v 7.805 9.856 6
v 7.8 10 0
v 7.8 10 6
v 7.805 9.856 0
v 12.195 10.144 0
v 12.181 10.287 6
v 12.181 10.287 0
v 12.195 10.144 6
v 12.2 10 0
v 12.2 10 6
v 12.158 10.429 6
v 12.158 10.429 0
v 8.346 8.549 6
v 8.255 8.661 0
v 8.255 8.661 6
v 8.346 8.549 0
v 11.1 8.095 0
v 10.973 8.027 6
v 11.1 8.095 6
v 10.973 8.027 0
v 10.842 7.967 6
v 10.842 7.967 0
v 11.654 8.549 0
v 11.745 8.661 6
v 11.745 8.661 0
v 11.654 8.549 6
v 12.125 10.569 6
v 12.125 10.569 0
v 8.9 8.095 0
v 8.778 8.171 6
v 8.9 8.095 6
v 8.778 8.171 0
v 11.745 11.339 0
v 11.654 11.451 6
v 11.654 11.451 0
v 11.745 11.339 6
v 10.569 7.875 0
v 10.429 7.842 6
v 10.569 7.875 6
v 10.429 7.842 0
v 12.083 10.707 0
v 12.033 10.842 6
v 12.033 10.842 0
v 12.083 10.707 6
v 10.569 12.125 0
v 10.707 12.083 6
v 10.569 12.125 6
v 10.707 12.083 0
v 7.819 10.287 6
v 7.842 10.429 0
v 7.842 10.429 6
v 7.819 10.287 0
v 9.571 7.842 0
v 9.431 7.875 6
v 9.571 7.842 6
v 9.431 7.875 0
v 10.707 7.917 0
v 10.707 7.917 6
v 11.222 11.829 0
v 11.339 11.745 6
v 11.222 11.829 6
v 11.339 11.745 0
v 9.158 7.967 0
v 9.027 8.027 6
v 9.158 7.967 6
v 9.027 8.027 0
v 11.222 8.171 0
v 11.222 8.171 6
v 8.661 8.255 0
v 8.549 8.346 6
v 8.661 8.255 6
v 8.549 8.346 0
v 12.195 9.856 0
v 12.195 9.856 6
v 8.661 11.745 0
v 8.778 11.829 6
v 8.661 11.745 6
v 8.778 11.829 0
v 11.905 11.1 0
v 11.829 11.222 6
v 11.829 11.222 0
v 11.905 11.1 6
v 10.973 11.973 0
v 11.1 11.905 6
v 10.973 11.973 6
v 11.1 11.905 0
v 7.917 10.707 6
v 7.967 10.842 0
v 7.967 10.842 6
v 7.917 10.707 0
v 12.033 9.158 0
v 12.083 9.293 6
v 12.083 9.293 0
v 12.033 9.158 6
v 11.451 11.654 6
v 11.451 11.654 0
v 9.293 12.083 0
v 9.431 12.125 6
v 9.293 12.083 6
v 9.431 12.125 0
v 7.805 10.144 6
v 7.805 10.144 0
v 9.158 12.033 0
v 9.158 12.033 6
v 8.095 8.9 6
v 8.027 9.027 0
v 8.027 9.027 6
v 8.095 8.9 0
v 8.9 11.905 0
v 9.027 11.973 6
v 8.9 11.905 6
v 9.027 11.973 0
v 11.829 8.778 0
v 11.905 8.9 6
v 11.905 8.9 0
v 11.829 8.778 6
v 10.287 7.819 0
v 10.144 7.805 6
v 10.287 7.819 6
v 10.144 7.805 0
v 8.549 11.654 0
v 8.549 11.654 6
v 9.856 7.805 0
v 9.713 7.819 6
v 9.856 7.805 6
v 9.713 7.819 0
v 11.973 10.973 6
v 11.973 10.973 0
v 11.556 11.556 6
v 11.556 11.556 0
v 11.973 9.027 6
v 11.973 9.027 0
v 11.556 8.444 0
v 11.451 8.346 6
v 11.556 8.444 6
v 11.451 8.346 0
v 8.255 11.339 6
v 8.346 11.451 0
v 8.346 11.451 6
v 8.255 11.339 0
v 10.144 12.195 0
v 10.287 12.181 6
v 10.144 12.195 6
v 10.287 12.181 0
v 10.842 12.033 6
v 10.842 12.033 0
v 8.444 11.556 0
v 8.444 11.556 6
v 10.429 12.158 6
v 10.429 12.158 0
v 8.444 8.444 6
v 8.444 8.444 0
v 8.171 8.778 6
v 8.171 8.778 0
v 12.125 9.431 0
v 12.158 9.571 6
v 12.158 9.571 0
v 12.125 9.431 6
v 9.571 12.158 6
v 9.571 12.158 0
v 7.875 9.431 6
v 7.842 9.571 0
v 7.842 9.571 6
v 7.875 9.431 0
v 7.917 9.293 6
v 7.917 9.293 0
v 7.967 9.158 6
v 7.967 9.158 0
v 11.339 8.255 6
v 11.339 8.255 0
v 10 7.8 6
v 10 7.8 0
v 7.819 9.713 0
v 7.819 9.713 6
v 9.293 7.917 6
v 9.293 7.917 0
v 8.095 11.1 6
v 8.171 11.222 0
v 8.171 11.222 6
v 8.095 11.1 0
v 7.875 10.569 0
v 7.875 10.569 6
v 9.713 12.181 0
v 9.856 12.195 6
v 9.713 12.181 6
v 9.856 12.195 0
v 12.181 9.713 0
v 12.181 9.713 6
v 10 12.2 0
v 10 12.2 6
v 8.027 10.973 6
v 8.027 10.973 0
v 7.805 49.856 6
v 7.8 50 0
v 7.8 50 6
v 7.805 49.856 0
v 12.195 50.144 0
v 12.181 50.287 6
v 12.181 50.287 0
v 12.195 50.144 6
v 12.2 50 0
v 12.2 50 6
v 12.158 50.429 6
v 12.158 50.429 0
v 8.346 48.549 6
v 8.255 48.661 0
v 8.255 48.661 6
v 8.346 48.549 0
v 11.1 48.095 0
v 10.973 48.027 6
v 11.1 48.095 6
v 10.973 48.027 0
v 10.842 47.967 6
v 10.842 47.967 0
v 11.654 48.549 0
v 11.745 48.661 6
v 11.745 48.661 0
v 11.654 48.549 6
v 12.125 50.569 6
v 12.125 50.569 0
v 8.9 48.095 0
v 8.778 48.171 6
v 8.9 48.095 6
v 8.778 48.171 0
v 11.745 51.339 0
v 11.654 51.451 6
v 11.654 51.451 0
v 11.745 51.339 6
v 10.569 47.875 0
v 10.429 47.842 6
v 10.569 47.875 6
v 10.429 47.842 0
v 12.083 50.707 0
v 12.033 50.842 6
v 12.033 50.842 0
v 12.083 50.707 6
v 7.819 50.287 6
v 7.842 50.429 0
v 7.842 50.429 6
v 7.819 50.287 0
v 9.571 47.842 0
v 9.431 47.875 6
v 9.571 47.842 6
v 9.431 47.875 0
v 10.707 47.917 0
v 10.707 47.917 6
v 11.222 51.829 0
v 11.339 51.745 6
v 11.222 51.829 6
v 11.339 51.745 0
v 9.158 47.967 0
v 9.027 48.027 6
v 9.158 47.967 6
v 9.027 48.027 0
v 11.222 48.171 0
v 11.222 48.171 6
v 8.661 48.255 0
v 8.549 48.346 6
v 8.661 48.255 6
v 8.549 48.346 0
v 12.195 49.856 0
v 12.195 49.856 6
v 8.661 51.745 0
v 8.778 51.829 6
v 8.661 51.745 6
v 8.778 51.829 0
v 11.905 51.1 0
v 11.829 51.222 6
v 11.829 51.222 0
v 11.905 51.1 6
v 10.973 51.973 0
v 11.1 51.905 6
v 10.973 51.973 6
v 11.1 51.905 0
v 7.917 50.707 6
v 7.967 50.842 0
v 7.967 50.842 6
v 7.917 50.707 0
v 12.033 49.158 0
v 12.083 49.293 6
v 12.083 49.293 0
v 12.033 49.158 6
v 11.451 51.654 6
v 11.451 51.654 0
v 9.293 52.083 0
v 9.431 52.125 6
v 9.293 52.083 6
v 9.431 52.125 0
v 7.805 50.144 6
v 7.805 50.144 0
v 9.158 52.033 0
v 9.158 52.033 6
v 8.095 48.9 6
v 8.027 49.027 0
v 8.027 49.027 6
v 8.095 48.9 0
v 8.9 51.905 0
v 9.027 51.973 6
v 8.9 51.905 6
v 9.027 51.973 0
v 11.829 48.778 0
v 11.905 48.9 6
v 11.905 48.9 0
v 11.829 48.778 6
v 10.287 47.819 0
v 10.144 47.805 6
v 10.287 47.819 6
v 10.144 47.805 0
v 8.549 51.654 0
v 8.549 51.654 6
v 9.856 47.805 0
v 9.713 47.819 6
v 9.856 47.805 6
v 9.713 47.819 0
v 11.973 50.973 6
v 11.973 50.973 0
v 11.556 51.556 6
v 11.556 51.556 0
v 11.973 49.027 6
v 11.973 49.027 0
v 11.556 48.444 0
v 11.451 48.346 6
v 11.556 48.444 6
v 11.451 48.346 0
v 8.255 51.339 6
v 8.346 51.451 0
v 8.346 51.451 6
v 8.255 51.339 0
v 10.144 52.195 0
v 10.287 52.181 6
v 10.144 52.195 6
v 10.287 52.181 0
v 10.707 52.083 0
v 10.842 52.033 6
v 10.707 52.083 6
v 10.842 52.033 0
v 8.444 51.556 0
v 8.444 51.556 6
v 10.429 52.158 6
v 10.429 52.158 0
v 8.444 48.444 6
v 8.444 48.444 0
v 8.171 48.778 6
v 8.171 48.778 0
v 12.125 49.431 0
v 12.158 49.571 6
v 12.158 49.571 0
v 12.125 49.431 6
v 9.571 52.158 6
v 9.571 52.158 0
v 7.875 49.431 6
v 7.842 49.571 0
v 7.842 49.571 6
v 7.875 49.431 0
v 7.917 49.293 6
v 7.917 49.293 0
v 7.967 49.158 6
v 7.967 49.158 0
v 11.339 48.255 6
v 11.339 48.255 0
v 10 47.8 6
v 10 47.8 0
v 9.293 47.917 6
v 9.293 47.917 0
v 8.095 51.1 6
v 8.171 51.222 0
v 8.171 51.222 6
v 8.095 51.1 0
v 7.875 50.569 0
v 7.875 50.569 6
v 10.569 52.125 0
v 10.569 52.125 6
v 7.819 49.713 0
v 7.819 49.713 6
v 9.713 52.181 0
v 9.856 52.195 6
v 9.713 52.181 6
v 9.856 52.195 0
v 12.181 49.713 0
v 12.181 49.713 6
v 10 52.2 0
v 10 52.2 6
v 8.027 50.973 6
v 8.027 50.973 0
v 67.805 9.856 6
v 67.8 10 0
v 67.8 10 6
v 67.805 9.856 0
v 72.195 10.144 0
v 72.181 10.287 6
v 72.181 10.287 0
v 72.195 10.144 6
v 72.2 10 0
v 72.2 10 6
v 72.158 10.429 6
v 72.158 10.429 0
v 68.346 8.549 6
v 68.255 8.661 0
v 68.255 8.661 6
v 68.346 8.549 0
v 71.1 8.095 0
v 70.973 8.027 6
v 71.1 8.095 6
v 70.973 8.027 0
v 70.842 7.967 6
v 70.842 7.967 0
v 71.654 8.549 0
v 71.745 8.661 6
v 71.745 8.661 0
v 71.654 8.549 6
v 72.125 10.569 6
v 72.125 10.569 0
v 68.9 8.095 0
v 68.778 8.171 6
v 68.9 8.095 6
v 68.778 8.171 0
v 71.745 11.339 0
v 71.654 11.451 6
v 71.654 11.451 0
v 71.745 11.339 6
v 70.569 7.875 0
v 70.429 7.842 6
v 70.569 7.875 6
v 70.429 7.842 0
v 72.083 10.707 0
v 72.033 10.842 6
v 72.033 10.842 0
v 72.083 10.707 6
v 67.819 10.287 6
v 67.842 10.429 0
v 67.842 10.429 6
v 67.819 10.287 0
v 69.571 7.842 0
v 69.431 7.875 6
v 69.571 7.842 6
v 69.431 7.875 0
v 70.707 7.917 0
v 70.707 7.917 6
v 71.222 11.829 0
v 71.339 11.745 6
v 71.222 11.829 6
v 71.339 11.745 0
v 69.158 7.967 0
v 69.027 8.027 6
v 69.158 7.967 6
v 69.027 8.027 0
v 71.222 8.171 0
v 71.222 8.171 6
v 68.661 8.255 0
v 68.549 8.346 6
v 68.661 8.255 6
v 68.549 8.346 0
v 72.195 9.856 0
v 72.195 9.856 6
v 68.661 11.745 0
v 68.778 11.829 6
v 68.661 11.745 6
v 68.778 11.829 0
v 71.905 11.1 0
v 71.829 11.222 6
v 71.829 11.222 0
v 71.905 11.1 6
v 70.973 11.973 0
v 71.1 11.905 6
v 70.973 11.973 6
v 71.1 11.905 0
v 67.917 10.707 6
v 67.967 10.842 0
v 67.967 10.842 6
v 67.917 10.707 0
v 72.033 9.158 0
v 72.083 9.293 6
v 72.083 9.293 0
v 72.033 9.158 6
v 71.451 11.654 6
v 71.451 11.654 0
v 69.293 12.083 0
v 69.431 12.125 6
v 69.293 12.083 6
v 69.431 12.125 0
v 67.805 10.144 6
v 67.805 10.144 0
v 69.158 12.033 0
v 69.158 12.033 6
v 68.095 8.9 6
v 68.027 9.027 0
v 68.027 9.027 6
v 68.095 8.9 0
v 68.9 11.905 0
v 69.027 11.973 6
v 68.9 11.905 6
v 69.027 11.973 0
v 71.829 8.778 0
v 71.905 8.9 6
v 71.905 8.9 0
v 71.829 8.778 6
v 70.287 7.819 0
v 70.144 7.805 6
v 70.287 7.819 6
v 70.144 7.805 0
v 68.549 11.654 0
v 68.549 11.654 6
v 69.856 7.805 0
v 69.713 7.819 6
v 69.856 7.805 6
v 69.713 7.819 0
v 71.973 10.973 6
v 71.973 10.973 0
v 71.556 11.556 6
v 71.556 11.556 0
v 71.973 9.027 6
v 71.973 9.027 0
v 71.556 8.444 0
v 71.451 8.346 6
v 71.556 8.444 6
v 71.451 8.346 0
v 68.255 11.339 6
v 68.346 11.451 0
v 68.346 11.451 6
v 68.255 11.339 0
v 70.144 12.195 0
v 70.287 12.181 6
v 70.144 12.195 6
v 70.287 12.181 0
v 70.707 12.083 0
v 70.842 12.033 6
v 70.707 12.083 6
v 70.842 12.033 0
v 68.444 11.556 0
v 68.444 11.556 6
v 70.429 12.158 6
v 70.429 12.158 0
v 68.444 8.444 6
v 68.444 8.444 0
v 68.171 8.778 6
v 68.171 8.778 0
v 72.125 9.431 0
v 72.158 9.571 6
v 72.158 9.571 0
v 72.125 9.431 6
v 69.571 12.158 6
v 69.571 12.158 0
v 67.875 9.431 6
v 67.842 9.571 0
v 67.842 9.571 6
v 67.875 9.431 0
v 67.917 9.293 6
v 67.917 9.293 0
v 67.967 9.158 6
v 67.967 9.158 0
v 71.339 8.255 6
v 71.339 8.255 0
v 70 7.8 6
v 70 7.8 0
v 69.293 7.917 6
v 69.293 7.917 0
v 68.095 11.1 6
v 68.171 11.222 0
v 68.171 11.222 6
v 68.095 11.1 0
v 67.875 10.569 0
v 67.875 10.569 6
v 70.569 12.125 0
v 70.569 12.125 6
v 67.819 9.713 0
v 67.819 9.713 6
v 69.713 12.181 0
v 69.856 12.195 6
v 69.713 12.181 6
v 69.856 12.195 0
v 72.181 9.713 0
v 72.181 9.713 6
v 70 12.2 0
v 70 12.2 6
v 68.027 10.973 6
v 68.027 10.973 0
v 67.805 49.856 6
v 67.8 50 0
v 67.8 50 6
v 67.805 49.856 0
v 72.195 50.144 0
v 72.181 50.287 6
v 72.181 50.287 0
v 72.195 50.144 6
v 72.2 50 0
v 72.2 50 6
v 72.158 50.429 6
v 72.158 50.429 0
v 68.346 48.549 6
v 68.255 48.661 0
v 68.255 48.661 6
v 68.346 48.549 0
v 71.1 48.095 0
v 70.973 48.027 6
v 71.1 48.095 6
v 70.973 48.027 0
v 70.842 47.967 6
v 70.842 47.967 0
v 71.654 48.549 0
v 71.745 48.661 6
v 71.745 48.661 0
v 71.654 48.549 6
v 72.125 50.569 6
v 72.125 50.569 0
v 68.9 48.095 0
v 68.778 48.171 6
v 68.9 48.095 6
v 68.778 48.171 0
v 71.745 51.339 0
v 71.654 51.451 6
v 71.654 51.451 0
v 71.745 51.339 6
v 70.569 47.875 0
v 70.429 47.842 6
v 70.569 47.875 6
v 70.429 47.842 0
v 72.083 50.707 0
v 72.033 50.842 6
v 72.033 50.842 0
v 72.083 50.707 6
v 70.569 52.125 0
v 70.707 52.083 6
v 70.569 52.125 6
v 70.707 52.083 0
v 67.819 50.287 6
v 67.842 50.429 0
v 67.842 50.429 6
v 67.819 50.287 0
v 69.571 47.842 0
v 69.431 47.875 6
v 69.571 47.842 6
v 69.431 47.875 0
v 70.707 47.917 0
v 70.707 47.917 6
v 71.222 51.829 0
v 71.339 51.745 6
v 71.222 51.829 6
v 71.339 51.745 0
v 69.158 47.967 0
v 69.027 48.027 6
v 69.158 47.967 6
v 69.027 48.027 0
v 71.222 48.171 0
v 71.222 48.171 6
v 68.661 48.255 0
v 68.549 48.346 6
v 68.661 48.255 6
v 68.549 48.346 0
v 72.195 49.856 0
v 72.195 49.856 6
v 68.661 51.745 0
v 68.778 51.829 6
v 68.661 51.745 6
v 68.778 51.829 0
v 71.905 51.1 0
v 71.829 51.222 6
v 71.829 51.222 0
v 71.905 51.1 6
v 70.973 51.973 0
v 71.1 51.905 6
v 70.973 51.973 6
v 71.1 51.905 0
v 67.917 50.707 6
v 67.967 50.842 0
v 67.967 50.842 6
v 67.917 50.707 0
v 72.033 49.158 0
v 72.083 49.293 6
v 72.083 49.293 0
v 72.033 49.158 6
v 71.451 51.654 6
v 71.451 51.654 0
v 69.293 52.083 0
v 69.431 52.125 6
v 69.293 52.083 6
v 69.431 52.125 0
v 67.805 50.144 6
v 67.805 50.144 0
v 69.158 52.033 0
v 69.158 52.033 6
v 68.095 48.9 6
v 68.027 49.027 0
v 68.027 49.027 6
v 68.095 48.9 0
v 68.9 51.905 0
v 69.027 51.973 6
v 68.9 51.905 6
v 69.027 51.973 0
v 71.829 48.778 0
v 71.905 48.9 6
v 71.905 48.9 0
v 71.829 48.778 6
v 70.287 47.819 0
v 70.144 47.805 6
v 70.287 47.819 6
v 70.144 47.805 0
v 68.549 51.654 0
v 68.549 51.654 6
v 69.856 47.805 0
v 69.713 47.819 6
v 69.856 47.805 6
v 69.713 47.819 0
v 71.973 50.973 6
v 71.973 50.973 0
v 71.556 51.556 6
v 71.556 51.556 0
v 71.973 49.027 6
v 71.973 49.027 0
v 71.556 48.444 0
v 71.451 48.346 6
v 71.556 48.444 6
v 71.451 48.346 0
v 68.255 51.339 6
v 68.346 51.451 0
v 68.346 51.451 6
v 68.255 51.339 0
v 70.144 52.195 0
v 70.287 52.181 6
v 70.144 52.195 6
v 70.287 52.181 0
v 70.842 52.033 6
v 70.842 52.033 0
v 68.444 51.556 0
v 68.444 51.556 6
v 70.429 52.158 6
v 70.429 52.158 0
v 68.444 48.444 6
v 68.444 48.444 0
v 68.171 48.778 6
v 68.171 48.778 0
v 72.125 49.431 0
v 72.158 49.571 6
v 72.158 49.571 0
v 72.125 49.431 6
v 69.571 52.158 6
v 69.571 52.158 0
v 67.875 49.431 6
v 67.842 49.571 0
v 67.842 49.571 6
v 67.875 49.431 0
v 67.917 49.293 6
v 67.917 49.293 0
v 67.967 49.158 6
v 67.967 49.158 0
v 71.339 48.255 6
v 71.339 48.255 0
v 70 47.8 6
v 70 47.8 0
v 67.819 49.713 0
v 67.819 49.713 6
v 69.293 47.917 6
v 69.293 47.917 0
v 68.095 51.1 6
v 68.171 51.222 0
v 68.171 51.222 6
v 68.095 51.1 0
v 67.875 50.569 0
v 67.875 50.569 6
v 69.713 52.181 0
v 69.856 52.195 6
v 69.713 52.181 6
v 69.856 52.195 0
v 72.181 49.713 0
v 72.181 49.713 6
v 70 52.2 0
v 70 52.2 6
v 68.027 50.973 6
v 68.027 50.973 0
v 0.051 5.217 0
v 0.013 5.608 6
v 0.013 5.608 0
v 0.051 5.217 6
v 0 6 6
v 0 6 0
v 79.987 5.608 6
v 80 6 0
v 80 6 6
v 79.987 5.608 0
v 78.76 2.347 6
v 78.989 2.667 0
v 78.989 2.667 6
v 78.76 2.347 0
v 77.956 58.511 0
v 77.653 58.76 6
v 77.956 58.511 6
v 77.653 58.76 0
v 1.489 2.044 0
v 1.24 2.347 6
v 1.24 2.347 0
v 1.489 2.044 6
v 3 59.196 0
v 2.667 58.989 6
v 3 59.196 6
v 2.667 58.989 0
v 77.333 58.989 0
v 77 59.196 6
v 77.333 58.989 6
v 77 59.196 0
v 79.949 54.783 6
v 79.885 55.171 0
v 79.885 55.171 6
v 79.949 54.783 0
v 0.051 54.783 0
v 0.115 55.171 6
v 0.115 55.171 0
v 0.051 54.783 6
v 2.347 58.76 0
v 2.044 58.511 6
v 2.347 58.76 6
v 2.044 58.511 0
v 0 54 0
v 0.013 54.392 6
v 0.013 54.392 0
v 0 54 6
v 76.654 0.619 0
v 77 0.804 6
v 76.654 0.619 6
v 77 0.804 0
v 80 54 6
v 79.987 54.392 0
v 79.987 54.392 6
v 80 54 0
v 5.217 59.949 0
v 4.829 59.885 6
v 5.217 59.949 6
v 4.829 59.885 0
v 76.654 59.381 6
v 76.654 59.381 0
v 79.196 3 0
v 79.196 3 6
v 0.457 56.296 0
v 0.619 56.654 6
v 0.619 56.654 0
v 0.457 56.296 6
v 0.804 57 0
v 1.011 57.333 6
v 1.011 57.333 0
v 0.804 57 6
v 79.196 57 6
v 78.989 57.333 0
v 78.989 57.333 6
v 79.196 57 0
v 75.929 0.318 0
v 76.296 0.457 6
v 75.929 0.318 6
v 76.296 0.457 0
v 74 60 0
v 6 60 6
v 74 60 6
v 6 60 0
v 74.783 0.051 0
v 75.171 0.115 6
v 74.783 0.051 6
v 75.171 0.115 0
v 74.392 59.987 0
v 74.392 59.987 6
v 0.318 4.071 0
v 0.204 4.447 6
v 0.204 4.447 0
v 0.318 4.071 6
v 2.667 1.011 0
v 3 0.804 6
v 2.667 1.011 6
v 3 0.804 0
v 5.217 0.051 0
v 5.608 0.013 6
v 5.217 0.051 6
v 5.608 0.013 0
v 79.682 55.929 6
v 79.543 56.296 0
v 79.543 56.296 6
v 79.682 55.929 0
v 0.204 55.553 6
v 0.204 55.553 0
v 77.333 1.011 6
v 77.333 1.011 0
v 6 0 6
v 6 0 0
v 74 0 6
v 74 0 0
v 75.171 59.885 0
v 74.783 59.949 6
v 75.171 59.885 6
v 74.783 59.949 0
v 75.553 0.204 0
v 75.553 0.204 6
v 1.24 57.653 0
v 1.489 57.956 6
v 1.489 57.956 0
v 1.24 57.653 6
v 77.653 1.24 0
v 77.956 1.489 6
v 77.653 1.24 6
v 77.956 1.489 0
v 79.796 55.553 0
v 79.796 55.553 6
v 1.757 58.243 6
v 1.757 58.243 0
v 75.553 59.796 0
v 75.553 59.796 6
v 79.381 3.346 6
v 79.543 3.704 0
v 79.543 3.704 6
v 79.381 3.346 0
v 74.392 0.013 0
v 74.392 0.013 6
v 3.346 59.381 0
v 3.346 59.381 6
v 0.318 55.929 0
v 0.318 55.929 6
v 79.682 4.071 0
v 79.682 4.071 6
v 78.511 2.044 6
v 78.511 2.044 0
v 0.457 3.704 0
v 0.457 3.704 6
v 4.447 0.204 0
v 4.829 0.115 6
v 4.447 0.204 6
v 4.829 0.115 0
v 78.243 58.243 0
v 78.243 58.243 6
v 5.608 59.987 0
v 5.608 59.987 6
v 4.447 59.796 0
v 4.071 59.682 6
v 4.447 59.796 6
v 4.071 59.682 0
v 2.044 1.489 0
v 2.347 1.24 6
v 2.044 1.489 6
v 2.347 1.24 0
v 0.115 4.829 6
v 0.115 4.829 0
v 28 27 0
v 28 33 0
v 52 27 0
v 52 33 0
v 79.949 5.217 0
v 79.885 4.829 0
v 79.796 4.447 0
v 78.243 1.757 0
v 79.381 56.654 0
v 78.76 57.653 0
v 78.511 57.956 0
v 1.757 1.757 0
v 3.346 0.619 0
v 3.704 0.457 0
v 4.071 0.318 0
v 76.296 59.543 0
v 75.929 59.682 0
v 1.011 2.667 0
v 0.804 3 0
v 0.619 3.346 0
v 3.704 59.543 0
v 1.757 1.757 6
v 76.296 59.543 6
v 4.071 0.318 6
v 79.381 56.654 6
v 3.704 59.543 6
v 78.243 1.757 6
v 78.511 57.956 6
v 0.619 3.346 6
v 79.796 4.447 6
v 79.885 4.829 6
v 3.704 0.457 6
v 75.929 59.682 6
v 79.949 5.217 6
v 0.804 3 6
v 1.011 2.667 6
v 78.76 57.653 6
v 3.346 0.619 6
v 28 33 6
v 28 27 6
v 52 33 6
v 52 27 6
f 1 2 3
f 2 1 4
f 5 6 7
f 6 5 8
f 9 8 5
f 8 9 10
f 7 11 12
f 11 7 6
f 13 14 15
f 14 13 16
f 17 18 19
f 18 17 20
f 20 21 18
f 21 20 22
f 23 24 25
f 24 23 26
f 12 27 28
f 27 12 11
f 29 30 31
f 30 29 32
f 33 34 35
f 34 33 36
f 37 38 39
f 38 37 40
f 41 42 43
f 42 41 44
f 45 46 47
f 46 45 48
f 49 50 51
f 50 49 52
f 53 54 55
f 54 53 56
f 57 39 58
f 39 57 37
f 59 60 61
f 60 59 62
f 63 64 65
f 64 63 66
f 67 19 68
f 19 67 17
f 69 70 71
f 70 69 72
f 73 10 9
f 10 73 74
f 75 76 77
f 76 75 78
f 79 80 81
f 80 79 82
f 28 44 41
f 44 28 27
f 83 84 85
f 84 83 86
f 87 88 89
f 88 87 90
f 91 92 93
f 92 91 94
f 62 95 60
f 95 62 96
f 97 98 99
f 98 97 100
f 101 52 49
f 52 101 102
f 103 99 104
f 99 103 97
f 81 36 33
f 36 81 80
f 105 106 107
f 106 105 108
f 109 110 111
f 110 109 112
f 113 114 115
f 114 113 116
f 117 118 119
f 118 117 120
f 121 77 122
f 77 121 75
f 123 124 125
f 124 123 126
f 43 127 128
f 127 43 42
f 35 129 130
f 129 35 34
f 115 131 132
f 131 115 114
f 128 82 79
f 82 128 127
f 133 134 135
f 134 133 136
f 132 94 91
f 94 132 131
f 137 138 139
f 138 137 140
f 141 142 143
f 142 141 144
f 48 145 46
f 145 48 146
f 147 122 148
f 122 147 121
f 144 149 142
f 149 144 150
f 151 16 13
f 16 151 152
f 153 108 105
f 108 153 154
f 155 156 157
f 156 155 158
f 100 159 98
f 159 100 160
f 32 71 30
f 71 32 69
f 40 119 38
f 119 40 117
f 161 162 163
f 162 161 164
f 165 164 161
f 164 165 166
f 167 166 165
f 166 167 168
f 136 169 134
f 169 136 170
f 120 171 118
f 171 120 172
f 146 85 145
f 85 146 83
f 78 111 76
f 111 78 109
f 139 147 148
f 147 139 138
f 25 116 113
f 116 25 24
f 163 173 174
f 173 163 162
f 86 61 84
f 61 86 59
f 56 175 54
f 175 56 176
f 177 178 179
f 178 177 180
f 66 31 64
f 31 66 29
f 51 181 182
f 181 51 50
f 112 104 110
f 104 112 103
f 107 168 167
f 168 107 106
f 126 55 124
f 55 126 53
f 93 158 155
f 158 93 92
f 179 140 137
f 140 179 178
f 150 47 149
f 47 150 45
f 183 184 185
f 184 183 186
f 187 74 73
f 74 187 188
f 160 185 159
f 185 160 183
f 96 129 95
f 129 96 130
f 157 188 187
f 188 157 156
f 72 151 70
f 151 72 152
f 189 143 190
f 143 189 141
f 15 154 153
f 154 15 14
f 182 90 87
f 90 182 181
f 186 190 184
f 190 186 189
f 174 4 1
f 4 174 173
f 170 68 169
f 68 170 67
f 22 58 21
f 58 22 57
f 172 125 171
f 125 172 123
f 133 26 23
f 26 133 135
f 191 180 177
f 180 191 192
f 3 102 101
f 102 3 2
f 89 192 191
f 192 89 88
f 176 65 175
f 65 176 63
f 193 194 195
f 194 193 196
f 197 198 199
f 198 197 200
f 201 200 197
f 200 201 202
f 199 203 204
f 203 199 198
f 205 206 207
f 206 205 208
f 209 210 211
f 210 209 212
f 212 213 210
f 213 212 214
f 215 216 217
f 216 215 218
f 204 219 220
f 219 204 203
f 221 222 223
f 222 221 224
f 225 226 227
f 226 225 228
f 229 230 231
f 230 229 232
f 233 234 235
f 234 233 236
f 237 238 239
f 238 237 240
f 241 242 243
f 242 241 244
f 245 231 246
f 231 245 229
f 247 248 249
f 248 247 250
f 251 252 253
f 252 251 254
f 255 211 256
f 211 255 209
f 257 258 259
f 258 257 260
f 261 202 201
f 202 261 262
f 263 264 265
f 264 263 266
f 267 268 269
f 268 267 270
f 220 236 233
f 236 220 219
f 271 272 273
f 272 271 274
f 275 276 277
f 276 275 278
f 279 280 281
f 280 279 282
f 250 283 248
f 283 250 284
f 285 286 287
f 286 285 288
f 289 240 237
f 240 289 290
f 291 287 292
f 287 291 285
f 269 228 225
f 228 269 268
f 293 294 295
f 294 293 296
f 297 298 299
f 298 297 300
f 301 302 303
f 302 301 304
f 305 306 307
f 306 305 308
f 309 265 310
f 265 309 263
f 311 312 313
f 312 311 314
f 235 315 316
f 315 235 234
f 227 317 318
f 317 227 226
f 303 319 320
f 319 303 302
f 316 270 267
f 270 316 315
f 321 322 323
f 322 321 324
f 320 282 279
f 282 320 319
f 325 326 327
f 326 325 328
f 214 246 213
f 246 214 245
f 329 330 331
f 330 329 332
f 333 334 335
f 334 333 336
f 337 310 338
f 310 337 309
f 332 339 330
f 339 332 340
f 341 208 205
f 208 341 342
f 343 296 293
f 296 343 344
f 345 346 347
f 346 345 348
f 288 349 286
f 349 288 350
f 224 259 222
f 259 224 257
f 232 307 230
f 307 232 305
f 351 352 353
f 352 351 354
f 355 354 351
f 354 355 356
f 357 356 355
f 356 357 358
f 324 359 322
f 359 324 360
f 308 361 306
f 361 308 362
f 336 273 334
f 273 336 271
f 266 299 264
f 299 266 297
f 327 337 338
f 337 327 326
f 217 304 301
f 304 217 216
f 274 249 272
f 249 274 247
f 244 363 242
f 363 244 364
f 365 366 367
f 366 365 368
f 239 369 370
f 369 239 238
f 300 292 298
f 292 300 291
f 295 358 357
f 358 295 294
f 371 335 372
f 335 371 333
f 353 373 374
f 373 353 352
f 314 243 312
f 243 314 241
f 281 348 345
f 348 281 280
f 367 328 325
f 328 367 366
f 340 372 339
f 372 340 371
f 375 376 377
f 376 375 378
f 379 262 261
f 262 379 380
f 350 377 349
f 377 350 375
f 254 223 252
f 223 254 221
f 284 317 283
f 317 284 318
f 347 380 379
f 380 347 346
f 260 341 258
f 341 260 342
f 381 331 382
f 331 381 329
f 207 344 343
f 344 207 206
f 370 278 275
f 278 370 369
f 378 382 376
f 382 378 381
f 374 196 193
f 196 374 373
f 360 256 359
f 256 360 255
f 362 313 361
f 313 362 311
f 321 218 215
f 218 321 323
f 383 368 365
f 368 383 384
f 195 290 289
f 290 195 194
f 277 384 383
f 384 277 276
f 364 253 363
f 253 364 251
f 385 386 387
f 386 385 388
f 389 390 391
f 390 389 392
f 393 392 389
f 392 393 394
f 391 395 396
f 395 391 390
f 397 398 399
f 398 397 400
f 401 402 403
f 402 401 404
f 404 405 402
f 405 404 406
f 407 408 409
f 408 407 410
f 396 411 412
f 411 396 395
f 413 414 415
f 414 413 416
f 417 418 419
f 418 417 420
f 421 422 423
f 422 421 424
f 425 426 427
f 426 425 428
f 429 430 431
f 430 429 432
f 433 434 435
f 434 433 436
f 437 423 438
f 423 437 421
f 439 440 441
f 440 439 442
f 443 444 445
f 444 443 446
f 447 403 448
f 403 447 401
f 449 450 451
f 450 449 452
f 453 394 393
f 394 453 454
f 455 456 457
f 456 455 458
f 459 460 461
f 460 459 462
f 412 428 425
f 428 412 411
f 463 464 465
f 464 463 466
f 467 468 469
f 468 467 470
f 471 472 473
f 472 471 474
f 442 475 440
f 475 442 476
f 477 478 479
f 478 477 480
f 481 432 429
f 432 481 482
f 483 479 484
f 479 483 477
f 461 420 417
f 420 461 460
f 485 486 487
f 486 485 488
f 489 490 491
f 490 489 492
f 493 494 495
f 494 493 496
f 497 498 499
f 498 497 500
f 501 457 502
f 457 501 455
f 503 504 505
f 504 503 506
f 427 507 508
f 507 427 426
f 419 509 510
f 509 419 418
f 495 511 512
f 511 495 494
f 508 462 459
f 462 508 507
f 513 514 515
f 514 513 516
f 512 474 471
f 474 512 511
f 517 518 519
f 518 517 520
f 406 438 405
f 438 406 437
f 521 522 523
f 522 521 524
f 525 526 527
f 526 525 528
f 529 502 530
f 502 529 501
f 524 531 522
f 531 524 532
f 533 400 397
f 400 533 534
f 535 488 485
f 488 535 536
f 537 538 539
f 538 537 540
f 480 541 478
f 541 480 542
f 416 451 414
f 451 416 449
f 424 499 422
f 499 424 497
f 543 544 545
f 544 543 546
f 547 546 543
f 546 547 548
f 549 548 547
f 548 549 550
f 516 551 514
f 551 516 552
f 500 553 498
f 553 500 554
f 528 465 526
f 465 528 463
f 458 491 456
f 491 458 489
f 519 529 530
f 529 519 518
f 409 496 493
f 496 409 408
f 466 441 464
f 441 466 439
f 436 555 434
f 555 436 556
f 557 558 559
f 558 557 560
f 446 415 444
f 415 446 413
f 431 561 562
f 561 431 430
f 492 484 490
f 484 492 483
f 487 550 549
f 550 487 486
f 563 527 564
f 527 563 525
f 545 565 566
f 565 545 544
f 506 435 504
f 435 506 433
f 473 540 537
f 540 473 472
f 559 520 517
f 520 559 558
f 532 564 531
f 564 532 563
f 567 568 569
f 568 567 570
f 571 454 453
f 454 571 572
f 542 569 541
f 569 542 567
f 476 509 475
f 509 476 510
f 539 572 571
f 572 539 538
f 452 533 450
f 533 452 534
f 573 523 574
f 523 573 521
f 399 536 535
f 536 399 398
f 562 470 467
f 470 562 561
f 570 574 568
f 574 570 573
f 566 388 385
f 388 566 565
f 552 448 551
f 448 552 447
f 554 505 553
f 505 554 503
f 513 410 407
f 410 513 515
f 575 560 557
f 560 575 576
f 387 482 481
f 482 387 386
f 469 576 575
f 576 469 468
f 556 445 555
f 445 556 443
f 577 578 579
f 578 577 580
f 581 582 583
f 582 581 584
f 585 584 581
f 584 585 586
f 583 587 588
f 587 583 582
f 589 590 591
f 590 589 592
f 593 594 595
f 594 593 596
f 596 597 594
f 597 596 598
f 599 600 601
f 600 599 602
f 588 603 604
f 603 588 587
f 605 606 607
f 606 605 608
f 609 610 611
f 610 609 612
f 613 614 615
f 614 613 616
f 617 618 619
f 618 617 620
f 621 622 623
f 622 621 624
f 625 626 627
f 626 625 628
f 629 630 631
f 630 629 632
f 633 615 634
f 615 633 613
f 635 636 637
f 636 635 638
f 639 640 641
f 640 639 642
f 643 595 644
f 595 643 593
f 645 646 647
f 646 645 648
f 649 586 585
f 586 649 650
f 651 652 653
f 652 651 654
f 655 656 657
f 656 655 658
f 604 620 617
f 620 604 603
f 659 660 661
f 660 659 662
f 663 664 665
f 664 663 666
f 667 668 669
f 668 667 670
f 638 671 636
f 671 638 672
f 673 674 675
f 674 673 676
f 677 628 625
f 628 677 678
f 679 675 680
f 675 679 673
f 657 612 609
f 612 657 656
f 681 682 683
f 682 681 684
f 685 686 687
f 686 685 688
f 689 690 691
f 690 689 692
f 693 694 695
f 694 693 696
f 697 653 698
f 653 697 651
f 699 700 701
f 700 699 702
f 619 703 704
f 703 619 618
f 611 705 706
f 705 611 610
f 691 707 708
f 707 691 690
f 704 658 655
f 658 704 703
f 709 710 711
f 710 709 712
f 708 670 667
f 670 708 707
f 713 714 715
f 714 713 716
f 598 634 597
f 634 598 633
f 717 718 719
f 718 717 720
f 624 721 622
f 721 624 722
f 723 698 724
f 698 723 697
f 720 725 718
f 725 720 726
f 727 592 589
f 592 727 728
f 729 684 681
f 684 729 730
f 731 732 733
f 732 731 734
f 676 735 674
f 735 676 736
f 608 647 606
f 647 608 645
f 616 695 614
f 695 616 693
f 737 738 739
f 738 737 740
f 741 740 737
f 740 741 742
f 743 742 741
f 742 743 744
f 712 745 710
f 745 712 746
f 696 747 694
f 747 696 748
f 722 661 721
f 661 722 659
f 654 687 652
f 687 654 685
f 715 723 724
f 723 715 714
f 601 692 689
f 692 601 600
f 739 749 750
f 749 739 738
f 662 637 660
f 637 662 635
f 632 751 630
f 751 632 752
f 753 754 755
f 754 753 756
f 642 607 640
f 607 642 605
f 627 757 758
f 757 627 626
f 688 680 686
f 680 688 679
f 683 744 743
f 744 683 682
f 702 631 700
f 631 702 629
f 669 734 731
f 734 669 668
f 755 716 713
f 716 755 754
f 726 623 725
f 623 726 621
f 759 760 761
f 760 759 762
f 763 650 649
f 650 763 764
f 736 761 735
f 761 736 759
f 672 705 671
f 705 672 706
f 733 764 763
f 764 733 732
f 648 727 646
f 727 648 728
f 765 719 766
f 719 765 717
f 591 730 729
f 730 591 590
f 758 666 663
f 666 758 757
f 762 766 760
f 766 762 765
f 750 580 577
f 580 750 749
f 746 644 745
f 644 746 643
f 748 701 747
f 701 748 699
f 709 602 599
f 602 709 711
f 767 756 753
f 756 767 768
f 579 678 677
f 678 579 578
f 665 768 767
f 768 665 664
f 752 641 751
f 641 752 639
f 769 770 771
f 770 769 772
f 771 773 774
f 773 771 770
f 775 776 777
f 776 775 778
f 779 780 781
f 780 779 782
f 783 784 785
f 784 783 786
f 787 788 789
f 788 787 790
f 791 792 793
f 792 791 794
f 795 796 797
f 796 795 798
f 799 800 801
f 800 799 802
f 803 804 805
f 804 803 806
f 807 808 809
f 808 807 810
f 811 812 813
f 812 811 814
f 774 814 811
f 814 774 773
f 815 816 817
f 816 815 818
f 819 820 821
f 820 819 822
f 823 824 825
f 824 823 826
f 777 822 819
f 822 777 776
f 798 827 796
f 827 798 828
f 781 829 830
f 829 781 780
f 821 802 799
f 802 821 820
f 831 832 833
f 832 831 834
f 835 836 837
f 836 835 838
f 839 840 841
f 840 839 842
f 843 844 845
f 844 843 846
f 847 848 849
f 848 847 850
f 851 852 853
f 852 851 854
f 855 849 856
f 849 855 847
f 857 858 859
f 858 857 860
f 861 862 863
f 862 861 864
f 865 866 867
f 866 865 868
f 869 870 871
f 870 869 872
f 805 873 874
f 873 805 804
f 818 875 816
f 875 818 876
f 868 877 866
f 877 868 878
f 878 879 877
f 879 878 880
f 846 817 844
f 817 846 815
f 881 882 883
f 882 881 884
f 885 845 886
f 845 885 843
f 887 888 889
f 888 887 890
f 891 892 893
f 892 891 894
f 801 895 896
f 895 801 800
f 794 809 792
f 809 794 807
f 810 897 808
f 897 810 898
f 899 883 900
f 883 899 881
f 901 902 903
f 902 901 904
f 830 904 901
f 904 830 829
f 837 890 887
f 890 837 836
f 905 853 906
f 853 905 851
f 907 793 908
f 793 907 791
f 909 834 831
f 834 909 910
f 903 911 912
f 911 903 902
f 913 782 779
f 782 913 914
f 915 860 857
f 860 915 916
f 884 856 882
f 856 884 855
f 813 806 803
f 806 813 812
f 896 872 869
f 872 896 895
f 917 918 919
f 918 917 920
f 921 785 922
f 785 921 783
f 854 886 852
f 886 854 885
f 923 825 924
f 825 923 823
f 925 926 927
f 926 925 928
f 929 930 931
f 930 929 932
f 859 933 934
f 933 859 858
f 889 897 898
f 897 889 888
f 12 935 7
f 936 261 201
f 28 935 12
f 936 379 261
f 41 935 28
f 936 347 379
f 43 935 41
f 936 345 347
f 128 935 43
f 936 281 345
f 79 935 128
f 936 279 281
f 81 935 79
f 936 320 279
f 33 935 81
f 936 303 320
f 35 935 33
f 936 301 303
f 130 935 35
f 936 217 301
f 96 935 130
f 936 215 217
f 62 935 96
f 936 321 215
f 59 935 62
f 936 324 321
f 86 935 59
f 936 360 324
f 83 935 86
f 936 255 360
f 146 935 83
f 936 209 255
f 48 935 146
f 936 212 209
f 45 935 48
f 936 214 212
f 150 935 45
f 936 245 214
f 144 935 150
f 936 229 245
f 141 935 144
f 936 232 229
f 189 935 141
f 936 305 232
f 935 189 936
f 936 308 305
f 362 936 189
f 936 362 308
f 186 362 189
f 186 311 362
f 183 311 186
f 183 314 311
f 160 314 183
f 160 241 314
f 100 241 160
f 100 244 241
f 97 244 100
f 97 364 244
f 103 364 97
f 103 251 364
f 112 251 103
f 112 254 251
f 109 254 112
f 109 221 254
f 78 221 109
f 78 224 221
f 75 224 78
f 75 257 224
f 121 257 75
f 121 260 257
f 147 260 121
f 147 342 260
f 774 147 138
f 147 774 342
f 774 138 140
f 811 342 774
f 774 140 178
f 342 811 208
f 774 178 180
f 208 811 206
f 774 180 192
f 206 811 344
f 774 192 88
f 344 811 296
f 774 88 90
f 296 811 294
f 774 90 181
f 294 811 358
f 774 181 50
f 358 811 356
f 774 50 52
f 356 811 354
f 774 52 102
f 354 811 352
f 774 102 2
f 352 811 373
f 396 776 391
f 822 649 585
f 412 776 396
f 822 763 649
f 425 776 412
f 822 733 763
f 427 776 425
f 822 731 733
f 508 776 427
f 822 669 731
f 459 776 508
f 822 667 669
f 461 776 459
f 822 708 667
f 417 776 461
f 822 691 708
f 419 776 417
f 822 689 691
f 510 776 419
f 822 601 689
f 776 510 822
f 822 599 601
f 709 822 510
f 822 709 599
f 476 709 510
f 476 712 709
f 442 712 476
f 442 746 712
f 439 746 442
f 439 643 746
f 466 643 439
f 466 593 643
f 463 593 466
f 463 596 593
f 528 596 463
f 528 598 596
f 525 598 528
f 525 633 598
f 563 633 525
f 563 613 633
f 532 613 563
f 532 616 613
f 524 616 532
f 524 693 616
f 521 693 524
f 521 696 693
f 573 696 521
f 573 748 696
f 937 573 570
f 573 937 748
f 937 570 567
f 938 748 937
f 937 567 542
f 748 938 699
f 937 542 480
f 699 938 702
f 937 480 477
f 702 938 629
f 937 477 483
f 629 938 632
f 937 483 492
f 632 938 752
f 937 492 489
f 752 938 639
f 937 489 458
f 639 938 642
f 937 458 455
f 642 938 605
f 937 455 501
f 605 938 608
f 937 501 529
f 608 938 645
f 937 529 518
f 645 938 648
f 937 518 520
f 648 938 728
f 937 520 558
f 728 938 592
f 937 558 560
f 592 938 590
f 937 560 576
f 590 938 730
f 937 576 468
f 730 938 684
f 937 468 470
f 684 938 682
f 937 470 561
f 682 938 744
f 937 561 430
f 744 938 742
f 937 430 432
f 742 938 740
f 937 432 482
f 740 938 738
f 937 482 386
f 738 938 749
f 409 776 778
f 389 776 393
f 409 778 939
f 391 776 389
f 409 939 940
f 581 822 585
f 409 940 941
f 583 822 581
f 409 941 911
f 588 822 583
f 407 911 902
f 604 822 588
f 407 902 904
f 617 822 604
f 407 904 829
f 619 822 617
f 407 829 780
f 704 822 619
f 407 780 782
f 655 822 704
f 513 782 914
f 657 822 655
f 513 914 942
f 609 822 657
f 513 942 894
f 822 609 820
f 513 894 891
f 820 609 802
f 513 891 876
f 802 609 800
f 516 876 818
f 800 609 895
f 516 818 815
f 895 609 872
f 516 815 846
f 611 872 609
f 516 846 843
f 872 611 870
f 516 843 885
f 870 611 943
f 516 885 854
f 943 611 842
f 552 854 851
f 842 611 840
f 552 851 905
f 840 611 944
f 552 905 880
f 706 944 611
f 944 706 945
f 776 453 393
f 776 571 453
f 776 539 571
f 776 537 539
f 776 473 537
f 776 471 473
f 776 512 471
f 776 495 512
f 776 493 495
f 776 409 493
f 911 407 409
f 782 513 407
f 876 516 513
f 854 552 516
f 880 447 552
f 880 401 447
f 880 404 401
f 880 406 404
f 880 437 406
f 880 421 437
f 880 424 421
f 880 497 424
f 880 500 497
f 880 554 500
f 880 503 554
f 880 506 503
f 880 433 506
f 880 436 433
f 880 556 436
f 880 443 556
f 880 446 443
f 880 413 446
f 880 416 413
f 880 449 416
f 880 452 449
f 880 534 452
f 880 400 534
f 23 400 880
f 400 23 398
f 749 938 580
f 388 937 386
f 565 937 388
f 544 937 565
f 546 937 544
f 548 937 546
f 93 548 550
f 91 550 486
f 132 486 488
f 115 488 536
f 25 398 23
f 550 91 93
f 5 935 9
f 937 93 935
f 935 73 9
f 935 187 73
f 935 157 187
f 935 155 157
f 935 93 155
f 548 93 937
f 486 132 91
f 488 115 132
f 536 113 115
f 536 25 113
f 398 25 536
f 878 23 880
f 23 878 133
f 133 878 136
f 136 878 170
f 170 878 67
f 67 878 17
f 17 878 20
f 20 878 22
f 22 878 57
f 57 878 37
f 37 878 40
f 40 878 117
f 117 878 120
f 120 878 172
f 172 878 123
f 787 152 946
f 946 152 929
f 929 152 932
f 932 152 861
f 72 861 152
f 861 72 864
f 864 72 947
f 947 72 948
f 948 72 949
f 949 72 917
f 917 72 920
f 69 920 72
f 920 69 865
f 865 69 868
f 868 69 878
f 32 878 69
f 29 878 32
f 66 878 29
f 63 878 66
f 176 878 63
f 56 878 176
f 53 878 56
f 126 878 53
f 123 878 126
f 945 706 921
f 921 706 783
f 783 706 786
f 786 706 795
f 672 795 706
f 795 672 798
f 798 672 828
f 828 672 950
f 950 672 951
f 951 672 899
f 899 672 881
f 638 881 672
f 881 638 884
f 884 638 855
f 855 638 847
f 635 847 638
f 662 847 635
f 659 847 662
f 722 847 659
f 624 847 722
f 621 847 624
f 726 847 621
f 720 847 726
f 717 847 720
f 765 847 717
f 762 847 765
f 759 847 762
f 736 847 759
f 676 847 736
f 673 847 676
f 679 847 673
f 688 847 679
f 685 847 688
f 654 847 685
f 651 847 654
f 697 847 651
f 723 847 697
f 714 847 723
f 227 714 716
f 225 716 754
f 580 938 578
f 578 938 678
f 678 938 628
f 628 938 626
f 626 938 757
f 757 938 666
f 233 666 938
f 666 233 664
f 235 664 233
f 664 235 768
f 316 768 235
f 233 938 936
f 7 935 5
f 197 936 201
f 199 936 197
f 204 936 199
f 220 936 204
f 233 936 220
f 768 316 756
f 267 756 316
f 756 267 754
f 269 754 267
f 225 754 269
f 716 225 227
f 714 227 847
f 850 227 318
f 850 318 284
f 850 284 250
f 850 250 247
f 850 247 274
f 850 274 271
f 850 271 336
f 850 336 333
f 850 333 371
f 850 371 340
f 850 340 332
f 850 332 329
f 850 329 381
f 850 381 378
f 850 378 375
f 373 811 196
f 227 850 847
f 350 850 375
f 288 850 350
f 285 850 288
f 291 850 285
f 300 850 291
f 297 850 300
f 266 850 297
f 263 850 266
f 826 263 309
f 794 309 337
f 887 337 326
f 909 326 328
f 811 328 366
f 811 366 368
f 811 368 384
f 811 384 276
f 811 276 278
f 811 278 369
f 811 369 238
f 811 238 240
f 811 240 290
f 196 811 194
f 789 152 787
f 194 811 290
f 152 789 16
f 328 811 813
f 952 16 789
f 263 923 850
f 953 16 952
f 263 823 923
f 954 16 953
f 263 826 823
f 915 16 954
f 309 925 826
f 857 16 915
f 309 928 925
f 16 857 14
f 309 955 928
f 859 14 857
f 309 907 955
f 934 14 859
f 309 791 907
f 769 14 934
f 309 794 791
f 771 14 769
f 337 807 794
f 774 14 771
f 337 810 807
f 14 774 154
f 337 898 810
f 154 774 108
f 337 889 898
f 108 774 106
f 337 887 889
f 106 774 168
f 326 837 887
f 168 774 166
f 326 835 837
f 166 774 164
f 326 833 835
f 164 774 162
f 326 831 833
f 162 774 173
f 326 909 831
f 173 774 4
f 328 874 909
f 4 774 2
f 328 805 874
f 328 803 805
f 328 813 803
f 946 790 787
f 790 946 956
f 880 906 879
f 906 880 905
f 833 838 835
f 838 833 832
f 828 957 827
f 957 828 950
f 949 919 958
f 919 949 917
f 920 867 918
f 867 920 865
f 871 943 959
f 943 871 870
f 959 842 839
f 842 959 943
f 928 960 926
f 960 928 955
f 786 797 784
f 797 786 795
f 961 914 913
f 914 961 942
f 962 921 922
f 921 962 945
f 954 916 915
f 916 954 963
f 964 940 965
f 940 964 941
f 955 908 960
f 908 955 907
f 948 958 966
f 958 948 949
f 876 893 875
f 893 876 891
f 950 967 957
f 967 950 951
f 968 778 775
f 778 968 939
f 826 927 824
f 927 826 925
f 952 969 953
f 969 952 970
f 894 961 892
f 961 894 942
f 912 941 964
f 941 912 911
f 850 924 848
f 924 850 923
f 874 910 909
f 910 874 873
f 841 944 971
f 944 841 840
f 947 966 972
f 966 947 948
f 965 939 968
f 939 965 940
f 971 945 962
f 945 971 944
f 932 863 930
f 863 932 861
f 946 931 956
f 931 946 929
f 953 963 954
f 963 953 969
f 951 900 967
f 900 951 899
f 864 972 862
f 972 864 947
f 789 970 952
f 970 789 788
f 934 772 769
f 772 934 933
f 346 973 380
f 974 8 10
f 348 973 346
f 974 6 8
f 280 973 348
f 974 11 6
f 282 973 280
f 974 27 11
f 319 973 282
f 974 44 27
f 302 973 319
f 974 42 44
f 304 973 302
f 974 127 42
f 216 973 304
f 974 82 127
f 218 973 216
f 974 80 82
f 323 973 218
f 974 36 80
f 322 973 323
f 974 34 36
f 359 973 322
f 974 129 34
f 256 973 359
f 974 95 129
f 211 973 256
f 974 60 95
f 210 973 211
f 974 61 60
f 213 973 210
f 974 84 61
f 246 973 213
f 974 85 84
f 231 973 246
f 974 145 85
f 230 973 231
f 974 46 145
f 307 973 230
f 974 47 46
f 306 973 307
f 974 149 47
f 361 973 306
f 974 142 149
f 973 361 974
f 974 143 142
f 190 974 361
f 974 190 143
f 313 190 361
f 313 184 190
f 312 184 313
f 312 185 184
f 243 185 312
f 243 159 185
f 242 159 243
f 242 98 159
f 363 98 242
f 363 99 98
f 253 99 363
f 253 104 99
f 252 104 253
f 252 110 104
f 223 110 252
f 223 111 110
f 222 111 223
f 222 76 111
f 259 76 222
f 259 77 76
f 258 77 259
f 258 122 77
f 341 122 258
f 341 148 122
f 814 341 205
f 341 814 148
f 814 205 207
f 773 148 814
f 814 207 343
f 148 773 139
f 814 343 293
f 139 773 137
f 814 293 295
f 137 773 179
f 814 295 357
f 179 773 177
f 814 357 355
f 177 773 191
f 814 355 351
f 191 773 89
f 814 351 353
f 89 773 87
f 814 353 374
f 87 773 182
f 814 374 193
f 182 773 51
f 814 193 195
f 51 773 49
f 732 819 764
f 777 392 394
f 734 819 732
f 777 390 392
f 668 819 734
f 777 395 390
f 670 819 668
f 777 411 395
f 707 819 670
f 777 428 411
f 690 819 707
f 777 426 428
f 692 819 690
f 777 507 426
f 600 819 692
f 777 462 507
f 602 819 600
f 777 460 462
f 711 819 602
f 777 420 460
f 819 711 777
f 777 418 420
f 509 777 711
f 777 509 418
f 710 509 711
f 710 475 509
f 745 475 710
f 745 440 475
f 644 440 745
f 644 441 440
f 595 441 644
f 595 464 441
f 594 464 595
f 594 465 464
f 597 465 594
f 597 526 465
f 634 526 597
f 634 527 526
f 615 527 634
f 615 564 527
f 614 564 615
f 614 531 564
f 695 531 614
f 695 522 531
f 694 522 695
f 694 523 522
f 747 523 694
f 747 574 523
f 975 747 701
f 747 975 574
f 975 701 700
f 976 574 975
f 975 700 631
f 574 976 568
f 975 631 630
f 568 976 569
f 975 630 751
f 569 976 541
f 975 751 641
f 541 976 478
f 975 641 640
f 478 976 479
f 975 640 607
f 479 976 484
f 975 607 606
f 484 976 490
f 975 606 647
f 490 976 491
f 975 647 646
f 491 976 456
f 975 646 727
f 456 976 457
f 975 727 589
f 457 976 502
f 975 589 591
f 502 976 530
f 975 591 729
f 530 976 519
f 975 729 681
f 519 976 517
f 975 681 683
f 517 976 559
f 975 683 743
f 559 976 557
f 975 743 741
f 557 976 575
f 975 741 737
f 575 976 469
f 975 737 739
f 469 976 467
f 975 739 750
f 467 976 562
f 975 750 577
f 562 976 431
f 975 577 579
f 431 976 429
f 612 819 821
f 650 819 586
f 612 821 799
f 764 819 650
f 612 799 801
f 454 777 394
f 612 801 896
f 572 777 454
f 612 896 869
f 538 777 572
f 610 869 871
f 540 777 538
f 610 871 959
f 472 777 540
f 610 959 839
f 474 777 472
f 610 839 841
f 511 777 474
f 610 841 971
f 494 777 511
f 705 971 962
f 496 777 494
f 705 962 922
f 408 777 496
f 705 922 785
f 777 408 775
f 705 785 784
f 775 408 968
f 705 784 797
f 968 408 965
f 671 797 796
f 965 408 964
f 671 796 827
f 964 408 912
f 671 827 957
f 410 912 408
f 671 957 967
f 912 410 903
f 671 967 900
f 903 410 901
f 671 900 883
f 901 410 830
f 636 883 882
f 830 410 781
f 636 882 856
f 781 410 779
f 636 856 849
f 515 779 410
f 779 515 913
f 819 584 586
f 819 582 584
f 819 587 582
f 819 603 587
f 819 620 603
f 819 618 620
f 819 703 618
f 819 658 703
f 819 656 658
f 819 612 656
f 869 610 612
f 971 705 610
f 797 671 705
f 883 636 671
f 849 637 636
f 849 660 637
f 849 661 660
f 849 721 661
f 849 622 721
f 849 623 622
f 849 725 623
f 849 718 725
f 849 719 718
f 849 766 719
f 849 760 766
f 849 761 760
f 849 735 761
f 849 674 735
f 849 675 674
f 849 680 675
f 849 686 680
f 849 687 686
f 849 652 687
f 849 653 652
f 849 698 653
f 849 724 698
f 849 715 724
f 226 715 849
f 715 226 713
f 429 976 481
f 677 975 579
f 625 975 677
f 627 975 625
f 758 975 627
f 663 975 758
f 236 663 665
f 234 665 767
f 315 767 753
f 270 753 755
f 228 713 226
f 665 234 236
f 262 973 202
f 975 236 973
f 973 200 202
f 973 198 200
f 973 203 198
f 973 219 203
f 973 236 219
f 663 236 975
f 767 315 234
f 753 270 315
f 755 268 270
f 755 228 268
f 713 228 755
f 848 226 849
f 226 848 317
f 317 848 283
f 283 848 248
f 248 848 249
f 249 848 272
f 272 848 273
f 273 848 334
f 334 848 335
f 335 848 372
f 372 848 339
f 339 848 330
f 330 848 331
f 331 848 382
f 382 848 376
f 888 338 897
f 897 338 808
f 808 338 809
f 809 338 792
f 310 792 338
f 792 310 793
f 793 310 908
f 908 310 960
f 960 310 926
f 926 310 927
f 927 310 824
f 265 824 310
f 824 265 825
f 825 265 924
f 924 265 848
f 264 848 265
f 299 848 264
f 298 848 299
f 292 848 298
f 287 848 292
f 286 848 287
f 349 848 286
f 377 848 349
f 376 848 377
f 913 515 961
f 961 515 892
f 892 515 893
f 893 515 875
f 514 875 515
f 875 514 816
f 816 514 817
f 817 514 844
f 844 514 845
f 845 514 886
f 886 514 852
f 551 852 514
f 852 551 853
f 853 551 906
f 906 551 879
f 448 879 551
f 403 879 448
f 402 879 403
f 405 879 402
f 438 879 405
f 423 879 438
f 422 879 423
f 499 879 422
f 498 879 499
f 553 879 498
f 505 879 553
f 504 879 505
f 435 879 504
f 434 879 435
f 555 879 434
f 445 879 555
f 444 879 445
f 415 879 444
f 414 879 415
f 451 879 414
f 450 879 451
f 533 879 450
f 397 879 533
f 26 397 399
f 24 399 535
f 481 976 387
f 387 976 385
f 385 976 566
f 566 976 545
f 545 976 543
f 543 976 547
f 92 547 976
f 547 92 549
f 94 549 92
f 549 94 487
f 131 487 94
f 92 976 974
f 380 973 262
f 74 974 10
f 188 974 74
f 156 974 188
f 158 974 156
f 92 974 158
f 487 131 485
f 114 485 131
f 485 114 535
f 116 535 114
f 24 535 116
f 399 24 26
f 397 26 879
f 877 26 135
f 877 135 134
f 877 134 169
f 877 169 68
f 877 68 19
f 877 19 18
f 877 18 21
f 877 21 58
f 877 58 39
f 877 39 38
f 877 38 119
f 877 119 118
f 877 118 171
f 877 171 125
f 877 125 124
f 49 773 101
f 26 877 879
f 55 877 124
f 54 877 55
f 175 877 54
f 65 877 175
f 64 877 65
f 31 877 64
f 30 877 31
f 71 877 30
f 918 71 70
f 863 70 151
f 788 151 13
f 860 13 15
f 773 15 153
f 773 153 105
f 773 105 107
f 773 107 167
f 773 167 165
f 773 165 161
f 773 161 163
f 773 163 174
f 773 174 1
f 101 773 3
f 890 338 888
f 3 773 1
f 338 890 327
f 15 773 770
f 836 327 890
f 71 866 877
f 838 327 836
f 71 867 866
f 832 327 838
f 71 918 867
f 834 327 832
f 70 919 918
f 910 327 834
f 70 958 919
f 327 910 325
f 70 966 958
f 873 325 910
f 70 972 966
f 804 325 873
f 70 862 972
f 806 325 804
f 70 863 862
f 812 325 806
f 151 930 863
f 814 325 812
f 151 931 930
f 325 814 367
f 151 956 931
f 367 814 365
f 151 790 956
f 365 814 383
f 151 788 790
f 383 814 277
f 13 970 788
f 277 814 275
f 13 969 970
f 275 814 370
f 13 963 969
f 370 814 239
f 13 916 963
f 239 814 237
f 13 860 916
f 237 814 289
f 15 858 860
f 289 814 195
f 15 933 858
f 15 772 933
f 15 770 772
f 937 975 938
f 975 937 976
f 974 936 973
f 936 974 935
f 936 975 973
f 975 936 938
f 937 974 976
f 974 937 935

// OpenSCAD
// file: ../lib/util.scad
include <../config.scad>

module rounded_rect_2d(size = [20, 20], r = 3) {
    assert(size[0] >= 2*r && size[1] >= 2*r, "rounded_rect_2d radius too large");
    hull() {
        for (x = [r, size[0]-r], y = [r, size[1]-r])
            translate([x, y]) circle(r = r);
    }
}

module rounded_plate(size = [20, 20], r = 3, h = 3) {
    linear_extrude(height = h) rounded_rect_2d(size = size, r = r);
}
// file: ../config.scad
// Shared project parameters.
// Replace EXAMPLE_* with real project parameter families after planning.

$fn = $preview ? 48 : 96;

// Manufacturing defaults — calibrate for the real printer/material.
FIT = 0.25;
PRESS_FIT = 0.10;
CLEARANCE = 0.40;
MIN_WALL = 2.40;

// Template demonstration geometry only.
EXAMPLE_PLATE = [80, 60, 6];
EXAMPLE_CORNER_R = 6;
EXAMPLE_HOLE_D = 4.4;
EXAMPLE_HOLE_SPACING = [60, 40];
EXAMPLE_ARM_L = 65;
EXAMPLE_ARM_W = 14;
EXAMPLE_ARM_H = 8;
EXAMPLE_PIVOT_D = 6;
EXAMPLE_MOTION_MIN = -45;
EXAMPLE_MOTION_MAX = 90;
// main file
include <../config.scad>
use <../lib/util.scad>

module example_part() {
    difference() {
        rounded_plate(EXAMPLE_PLATE, EXAMPLE_CORNER_R, EXAMPLE_PLATE[2]);
        for (x = [(EXAMPLE_PLATE[0]-EXAMPLE_HOLE_SPACING[0])/2,
                  (EXAMPLE_PLATE[0]+EXAMPLE_HOLE_SPACING[0])/2],
             y = [(EXAMPLE_PLATE[1]-EXAMPLE_HOLE_SPACING[1])/2,
                  (EXAMPLE_PLATE[1]+EXAMPLE_HOLE_SPACING[1])/2])
            translate([x, y, -1])
                cylinder(d = EXAMPLE_HOLE_D, h = EXAMPLE_PLATE[2] + 2);

        // Deliberately simple central service slot for section-view QA.
        translate([EXAMPLE_PLATE[0]/2 - 12, EXAMPLE_PLATE[1]/2 - 3, -1])
            cube([24, 6, EXAMPLE_PLATE[2] + 2]);
    }
}

example_part();
